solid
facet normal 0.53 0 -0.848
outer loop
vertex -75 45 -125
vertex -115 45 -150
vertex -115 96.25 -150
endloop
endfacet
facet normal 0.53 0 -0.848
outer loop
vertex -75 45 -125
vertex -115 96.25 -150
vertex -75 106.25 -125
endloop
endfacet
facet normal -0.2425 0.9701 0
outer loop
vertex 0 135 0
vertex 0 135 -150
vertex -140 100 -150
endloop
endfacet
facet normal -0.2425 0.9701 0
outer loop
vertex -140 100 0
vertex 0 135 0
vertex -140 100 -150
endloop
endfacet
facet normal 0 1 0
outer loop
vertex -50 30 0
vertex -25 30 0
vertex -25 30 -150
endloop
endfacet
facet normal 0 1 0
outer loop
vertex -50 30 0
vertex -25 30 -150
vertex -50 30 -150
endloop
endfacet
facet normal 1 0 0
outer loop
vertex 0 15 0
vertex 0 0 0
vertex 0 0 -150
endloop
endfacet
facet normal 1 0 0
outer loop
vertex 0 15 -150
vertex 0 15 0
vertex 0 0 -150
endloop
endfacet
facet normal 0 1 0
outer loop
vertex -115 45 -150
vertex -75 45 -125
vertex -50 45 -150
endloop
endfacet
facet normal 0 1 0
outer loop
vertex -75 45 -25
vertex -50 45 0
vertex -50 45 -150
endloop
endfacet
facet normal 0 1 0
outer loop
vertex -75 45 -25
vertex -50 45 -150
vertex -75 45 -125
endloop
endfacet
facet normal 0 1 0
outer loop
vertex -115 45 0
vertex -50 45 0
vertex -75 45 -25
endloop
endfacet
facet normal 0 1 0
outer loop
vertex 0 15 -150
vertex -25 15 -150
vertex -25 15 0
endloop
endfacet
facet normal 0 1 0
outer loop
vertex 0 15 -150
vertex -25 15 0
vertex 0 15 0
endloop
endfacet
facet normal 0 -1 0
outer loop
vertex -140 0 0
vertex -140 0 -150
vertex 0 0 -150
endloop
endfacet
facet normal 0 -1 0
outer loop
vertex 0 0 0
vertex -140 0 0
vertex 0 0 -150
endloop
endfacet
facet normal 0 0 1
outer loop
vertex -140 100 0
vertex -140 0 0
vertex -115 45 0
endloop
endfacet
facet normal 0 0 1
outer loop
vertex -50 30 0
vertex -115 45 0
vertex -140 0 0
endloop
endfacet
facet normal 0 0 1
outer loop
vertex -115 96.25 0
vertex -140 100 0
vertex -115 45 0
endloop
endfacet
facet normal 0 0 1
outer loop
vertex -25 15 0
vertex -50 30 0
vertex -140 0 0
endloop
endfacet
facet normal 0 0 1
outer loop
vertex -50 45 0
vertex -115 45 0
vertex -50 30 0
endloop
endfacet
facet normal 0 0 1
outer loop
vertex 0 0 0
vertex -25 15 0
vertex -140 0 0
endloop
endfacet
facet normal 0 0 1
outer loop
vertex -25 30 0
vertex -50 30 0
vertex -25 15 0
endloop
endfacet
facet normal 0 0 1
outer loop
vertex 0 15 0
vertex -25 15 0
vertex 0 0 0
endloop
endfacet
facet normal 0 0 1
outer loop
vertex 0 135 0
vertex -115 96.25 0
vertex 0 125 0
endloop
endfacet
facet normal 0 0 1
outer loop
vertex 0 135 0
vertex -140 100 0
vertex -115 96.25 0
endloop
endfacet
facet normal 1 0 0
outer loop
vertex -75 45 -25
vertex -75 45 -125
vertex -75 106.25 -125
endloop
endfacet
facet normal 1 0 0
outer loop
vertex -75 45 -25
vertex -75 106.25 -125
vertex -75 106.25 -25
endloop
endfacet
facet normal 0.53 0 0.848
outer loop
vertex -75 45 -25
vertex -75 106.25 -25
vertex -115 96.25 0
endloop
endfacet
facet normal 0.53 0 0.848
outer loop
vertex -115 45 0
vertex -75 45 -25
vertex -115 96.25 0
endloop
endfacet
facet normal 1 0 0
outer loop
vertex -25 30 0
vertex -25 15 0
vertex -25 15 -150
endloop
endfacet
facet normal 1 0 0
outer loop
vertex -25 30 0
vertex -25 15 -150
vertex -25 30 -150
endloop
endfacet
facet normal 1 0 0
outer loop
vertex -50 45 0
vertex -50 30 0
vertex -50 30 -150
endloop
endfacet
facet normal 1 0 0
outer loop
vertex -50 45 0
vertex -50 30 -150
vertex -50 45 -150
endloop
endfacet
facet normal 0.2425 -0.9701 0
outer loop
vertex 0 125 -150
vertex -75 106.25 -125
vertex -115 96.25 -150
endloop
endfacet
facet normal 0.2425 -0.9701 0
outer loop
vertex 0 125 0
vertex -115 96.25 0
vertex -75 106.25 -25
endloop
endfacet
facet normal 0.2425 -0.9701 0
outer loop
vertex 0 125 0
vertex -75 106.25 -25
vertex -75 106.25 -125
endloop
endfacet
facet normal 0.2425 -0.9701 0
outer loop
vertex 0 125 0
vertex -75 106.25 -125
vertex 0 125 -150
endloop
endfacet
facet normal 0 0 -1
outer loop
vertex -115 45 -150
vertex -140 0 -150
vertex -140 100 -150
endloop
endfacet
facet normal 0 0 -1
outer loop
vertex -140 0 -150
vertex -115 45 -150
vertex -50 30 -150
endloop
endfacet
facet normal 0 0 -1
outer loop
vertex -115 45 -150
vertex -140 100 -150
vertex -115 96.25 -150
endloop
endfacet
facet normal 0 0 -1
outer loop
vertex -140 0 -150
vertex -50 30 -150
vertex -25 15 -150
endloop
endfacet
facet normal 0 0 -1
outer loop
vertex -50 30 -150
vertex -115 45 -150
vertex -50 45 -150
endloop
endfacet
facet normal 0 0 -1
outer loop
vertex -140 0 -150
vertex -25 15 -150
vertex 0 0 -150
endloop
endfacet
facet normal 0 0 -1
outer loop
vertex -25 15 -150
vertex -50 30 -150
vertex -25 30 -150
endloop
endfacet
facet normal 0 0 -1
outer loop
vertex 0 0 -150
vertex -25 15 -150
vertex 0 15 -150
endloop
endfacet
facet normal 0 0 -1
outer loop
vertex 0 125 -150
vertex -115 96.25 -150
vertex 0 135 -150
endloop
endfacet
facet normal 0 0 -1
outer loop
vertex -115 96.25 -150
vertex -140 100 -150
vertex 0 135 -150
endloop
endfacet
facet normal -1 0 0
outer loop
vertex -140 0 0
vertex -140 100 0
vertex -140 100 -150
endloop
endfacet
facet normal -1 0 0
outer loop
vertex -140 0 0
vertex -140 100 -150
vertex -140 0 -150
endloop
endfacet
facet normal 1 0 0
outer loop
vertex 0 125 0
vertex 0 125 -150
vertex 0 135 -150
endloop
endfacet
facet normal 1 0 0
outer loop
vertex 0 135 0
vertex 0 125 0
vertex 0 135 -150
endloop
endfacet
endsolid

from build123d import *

# Parameters (mm, degrees)
SKETCH1_W      = 140
SKETCH1_H      = 150
EXTRUDE1_DEPTH = 15
EXTRUDE2_DEPTH = 150
EXTRUDE3_REACH = 92


with BuildPart() as part:
    # Sketch1 → Extrude1 (new body)
    with BuildSketch(Plane(origin=(0, 0, 0), x_dir=(1, 0, 0), z_dir=(0, 1, 0))):
        with Locations((-70, 75)):
            Rectangle(SKETCH1_W, SKETCH1_H)
    extrude(amount=EXTRUDE1_DEPTH)

    # Sketch2 → Extrude2 (add)
    with BuildSketch(Plane.XY):
        Polygon((-25, 15), (-25, 30), (-50, 30), (-50, 45), (-115, 45), (-115, 96.25), (0, 125), (0, 135), (-140, 100), (-140, 15), align=None)
    extrude(amount=-EXTRUDE2_DEPTH)

    # Extrude3: up to this plane
    extrude3_end = Plane(origin=(-115, 96.25, -150), z_dir=(0.242535625, -0.9701425, 0))
    # Sketch3 → Extrude3 (add, up to the surface)
    with BuildSketch(Plane(origin=(0, 45, 0), x_dir=(1, 0, 0), z_dir=(0, 1, 0)), mode=Mode.PRIVATE) as extrude3_sk1:
        Polygon((-115, 150), (-75, 125), (-75, 25), (-115, 0), align=None)
    extrude3_tool1 = split(extrude(extrude3_sk1.sketch, amount=EXTRUDE3_REACH, mode=Mode.PRIVATE), bisect_by=extrude3_end, keep=Keep.BOTH, mode=Mode.PRIVATE)
    add(extrude3_tool1.solids().sort_by_distance((-96.333333, 45, -75))[0])


solid = part.part
